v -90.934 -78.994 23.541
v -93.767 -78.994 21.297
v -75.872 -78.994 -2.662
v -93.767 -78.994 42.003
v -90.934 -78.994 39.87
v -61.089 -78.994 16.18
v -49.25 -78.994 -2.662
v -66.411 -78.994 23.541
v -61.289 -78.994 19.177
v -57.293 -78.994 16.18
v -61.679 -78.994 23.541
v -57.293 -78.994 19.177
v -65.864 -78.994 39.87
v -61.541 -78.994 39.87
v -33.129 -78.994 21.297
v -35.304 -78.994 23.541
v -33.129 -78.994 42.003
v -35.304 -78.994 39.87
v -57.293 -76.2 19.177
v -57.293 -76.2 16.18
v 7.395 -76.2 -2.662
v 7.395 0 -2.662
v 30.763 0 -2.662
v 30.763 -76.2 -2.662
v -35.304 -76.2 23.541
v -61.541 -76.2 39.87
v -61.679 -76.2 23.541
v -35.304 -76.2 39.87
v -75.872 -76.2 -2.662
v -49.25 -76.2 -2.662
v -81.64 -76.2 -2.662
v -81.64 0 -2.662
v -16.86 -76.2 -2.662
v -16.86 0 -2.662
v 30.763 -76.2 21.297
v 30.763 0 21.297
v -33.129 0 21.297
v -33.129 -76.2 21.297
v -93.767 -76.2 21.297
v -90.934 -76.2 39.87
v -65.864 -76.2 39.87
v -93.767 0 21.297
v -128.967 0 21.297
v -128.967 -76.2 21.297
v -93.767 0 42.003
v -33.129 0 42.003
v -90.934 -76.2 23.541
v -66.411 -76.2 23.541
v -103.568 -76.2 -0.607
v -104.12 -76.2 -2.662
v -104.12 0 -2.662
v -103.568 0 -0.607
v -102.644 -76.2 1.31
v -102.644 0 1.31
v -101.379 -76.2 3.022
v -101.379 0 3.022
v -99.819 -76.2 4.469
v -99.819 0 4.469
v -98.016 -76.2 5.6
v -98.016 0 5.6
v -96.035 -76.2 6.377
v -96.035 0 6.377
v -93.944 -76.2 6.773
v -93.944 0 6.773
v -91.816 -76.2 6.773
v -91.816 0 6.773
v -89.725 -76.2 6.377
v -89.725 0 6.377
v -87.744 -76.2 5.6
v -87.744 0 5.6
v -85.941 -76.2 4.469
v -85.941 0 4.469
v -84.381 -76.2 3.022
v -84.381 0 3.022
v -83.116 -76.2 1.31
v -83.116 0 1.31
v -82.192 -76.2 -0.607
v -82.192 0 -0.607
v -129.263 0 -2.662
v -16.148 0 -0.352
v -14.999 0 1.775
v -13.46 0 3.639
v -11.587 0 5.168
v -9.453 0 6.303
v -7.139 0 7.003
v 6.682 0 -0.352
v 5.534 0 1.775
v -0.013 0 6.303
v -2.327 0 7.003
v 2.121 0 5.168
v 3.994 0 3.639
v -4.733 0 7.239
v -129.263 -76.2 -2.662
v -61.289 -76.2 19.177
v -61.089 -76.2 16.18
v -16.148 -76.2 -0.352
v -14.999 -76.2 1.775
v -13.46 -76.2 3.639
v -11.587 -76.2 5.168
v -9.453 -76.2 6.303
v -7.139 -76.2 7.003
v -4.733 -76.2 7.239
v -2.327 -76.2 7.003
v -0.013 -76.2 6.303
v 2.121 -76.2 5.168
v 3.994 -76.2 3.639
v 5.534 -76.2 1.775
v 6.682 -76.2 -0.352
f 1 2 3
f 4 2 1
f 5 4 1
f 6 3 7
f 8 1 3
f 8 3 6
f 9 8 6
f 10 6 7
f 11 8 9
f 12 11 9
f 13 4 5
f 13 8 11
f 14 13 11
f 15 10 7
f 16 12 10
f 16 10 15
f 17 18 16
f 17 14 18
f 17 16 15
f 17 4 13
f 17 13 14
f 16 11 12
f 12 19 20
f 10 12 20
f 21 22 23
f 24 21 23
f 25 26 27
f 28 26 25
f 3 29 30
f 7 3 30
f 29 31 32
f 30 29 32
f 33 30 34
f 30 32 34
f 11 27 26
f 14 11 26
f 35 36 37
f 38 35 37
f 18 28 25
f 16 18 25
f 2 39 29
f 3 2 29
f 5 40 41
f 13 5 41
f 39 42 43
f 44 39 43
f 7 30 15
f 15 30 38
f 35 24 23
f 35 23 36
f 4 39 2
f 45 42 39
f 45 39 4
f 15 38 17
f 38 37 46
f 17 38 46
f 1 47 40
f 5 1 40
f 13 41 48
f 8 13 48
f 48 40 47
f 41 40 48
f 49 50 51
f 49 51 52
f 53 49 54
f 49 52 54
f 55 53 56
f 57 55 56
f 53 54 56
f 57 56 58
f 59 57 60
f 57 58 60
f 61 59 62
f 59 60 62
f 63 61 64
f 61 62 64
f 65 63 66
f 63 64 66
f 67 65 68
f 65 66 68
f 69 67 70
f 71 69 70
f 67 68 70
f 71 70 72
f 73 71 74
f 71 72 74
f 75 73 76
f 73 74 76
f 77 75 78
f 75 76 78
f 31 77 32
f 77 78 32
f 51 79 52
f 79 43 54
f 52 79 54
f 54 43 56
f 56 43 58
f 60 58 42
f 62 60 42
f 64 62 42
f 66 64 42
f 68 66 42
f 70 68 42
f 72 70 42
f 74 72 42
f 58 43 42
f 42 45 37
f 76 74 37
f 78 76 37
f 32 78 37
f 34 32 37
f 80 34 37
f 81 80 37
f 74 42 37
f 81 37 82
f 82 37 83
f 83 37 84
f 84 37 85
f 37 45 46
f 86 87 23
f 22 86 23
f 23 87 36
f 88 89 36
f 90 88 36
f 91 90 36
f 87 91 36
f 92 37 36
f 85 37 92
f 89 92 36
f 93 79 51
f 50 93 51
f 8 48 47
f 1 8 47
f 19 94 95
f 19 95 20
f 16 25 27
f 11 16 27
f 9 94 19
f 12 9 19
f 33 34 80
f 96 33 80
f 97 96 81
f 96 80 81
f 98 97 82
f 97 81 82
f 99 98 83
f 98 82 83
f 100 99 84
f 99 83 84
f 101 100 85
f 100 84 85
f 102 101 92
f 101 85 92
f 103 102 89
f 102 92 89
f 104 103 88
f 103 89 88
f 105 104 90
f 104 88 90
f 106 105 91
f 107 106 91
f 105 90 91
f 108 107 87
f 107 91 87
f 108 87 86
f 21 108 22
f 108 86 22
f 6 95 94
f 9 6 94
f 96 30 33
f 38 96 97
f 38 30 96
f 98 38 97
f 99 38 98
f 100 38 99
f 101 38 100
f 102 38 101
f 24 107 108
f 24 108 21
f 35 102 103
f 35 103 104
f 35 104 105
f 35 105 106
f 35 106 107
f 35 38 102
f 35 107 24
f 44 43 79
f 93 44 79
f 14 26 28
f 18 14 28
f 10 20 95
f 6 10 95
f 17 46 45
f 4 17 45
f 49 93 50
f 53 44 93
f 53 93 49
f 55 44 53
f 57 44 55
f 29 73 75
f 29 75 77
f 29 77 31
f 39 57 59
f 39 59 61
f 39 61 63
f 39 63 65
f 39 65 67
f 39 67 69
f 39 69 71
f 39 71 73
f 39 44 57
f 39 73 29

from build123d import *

# Parameters (mm, degrees)
F1_DEPTH = 76.2
F2_W     = 30.3190927953
F2_H     = 20.7057222724
F4_DEPTH = 2.794


# Not quite as in the source:
# - the program builds the solid bodies; features that only make, move or delete a surface that nothing else refers to are left out


with BuildPart() as f1:
    # F0 (on Front) → F1 (new body)
    with BuildSketch(Plane.XZ):
        Polygon((-93.7673449516, 21.5931143612), (-93.7673449516, 21.2973169982), (-93.7673449516, 12.9849165678), (-76.1796534061, -2.6621618308), (-63.4482521564, -2.6621618308), (-63.4482521564, 21.4452156797), align=None)
        Polygon((-63.4482521564, 42.0030392706), (-63.4482521564, 21.4452156797), (-33.1291593611, 21.2973169982), (-33.1291593611, 42.0030392706), align=None)
        Polygon((-93.7673449516, 42.0030392706), (-93.7673449516, 21.5931143612), (-63.4482521564, 21.4452156797), (-63.4482521564, 42.0030392706), align=None)
        with BuildLine():
            Line((30.7627860457, 21.2973169982), (-33.1291593611, 21.2973169982))
            Line((-33.1291593611, 21.2973169982), (-47.1545420587, -2.6621618308))
            Line((-47.1545420587, -2.6621618308), (-16.8603751808, -2.6621618308))
            ThreePointArc((-16.8603751808, -2.6621618308), (-4.7327380162, 7.2386136425), (7.3948991485, -2.6621618308))
            Line((7.3948991485, -2.6621618308), (30.7627860457, -2.6621618308))
            Line((30.7627860457, -2.6621618308), (30.7627860457, 21.2973169982))
        make_face()
        with BuildLine():
            Line((-93.7673449516, 21.2973169982), (-128.96707654, 21.2973169982))
            Line((-128.96707654, 21.2973169982), (-129.2628794909, -2.6621618308))
            Line((-129.2628794909, -2.6621618308), (-104.1202098131, -2.6621618308))
            ThreePointArc((-104.1202098131, -2.6621618308), (-92.8799584508, 6.8226352019), (-81.6397070885, -2.6621618308))
            Line((-81.6397070885, -2.6621618308), (-76.1796534061, -2.6621618308))
            Line((-76.1796534061, -2.6621618308), (-93.7673449516, 12.9849165678))
            Line((-93.7673449516, 12.9849165678), (-93.7673449516, 21.2973169982))
        make_face()
        Polygon((-33.1291593611, 21.2973169982), (-63.4482521564, 21.4452156797), (-63.4482521564, -2.6621618308), (-47.1545420587, -2.6621618308), align=None)
    extrude(amount=F1_DEPTH)

    # F2 (on face) → F4 (join)
    with BuildSketch(Plane.XZ.offset(76.2)):
        with Locations((-78.607798554, 31.6501781344)):
            Rectangle(F2_W, F2_H)
        Polygon((-90.9339487553, 39.8703143001), (-65.8644288778, 39.8703143001), (-66.4106756449, 23.5412772745), (-90.9339487553, 23.5412772745), align=None, mode=Mode.SUBTRACT)
        with Locations((-48.2887057588, 31.6501781344)):
            Rectangle(F2_W, F2_H)
        Polygon((-35.3044308722, 23.5412772745), (-61.6788230836, 23.5412772745), (-61.5411959589, 39.8703143001), (-35.3044308722, 39.8703143001), align=None, mode=Mode.SUBTRACT)
        Polygon((-63.4482521564, 21.2973169982), (-93.7673449516, 21.2973169982), (-75.8718252182, -2.6621618308), (-63.4482521564, -2.6621618308), align=None)
        Polygon((-33.1291593611, 21.2973169982), (-63.4482521564, 21.2973169982), (-63.4482521564, -2.6621618308), (-49.2500411347, -2.6621618308), align=None)
        Polygon((-57.2931170464, 16.1802023649), (-61.0887669027, 16.1802023649), (-61.2885393202, 19.1765353084), (-57.2931170464, 19.1765353084), align=None, mode=Mode.SUBTRACT)
    extrude(amount=F4_DEPTH)


solid = f1.part
